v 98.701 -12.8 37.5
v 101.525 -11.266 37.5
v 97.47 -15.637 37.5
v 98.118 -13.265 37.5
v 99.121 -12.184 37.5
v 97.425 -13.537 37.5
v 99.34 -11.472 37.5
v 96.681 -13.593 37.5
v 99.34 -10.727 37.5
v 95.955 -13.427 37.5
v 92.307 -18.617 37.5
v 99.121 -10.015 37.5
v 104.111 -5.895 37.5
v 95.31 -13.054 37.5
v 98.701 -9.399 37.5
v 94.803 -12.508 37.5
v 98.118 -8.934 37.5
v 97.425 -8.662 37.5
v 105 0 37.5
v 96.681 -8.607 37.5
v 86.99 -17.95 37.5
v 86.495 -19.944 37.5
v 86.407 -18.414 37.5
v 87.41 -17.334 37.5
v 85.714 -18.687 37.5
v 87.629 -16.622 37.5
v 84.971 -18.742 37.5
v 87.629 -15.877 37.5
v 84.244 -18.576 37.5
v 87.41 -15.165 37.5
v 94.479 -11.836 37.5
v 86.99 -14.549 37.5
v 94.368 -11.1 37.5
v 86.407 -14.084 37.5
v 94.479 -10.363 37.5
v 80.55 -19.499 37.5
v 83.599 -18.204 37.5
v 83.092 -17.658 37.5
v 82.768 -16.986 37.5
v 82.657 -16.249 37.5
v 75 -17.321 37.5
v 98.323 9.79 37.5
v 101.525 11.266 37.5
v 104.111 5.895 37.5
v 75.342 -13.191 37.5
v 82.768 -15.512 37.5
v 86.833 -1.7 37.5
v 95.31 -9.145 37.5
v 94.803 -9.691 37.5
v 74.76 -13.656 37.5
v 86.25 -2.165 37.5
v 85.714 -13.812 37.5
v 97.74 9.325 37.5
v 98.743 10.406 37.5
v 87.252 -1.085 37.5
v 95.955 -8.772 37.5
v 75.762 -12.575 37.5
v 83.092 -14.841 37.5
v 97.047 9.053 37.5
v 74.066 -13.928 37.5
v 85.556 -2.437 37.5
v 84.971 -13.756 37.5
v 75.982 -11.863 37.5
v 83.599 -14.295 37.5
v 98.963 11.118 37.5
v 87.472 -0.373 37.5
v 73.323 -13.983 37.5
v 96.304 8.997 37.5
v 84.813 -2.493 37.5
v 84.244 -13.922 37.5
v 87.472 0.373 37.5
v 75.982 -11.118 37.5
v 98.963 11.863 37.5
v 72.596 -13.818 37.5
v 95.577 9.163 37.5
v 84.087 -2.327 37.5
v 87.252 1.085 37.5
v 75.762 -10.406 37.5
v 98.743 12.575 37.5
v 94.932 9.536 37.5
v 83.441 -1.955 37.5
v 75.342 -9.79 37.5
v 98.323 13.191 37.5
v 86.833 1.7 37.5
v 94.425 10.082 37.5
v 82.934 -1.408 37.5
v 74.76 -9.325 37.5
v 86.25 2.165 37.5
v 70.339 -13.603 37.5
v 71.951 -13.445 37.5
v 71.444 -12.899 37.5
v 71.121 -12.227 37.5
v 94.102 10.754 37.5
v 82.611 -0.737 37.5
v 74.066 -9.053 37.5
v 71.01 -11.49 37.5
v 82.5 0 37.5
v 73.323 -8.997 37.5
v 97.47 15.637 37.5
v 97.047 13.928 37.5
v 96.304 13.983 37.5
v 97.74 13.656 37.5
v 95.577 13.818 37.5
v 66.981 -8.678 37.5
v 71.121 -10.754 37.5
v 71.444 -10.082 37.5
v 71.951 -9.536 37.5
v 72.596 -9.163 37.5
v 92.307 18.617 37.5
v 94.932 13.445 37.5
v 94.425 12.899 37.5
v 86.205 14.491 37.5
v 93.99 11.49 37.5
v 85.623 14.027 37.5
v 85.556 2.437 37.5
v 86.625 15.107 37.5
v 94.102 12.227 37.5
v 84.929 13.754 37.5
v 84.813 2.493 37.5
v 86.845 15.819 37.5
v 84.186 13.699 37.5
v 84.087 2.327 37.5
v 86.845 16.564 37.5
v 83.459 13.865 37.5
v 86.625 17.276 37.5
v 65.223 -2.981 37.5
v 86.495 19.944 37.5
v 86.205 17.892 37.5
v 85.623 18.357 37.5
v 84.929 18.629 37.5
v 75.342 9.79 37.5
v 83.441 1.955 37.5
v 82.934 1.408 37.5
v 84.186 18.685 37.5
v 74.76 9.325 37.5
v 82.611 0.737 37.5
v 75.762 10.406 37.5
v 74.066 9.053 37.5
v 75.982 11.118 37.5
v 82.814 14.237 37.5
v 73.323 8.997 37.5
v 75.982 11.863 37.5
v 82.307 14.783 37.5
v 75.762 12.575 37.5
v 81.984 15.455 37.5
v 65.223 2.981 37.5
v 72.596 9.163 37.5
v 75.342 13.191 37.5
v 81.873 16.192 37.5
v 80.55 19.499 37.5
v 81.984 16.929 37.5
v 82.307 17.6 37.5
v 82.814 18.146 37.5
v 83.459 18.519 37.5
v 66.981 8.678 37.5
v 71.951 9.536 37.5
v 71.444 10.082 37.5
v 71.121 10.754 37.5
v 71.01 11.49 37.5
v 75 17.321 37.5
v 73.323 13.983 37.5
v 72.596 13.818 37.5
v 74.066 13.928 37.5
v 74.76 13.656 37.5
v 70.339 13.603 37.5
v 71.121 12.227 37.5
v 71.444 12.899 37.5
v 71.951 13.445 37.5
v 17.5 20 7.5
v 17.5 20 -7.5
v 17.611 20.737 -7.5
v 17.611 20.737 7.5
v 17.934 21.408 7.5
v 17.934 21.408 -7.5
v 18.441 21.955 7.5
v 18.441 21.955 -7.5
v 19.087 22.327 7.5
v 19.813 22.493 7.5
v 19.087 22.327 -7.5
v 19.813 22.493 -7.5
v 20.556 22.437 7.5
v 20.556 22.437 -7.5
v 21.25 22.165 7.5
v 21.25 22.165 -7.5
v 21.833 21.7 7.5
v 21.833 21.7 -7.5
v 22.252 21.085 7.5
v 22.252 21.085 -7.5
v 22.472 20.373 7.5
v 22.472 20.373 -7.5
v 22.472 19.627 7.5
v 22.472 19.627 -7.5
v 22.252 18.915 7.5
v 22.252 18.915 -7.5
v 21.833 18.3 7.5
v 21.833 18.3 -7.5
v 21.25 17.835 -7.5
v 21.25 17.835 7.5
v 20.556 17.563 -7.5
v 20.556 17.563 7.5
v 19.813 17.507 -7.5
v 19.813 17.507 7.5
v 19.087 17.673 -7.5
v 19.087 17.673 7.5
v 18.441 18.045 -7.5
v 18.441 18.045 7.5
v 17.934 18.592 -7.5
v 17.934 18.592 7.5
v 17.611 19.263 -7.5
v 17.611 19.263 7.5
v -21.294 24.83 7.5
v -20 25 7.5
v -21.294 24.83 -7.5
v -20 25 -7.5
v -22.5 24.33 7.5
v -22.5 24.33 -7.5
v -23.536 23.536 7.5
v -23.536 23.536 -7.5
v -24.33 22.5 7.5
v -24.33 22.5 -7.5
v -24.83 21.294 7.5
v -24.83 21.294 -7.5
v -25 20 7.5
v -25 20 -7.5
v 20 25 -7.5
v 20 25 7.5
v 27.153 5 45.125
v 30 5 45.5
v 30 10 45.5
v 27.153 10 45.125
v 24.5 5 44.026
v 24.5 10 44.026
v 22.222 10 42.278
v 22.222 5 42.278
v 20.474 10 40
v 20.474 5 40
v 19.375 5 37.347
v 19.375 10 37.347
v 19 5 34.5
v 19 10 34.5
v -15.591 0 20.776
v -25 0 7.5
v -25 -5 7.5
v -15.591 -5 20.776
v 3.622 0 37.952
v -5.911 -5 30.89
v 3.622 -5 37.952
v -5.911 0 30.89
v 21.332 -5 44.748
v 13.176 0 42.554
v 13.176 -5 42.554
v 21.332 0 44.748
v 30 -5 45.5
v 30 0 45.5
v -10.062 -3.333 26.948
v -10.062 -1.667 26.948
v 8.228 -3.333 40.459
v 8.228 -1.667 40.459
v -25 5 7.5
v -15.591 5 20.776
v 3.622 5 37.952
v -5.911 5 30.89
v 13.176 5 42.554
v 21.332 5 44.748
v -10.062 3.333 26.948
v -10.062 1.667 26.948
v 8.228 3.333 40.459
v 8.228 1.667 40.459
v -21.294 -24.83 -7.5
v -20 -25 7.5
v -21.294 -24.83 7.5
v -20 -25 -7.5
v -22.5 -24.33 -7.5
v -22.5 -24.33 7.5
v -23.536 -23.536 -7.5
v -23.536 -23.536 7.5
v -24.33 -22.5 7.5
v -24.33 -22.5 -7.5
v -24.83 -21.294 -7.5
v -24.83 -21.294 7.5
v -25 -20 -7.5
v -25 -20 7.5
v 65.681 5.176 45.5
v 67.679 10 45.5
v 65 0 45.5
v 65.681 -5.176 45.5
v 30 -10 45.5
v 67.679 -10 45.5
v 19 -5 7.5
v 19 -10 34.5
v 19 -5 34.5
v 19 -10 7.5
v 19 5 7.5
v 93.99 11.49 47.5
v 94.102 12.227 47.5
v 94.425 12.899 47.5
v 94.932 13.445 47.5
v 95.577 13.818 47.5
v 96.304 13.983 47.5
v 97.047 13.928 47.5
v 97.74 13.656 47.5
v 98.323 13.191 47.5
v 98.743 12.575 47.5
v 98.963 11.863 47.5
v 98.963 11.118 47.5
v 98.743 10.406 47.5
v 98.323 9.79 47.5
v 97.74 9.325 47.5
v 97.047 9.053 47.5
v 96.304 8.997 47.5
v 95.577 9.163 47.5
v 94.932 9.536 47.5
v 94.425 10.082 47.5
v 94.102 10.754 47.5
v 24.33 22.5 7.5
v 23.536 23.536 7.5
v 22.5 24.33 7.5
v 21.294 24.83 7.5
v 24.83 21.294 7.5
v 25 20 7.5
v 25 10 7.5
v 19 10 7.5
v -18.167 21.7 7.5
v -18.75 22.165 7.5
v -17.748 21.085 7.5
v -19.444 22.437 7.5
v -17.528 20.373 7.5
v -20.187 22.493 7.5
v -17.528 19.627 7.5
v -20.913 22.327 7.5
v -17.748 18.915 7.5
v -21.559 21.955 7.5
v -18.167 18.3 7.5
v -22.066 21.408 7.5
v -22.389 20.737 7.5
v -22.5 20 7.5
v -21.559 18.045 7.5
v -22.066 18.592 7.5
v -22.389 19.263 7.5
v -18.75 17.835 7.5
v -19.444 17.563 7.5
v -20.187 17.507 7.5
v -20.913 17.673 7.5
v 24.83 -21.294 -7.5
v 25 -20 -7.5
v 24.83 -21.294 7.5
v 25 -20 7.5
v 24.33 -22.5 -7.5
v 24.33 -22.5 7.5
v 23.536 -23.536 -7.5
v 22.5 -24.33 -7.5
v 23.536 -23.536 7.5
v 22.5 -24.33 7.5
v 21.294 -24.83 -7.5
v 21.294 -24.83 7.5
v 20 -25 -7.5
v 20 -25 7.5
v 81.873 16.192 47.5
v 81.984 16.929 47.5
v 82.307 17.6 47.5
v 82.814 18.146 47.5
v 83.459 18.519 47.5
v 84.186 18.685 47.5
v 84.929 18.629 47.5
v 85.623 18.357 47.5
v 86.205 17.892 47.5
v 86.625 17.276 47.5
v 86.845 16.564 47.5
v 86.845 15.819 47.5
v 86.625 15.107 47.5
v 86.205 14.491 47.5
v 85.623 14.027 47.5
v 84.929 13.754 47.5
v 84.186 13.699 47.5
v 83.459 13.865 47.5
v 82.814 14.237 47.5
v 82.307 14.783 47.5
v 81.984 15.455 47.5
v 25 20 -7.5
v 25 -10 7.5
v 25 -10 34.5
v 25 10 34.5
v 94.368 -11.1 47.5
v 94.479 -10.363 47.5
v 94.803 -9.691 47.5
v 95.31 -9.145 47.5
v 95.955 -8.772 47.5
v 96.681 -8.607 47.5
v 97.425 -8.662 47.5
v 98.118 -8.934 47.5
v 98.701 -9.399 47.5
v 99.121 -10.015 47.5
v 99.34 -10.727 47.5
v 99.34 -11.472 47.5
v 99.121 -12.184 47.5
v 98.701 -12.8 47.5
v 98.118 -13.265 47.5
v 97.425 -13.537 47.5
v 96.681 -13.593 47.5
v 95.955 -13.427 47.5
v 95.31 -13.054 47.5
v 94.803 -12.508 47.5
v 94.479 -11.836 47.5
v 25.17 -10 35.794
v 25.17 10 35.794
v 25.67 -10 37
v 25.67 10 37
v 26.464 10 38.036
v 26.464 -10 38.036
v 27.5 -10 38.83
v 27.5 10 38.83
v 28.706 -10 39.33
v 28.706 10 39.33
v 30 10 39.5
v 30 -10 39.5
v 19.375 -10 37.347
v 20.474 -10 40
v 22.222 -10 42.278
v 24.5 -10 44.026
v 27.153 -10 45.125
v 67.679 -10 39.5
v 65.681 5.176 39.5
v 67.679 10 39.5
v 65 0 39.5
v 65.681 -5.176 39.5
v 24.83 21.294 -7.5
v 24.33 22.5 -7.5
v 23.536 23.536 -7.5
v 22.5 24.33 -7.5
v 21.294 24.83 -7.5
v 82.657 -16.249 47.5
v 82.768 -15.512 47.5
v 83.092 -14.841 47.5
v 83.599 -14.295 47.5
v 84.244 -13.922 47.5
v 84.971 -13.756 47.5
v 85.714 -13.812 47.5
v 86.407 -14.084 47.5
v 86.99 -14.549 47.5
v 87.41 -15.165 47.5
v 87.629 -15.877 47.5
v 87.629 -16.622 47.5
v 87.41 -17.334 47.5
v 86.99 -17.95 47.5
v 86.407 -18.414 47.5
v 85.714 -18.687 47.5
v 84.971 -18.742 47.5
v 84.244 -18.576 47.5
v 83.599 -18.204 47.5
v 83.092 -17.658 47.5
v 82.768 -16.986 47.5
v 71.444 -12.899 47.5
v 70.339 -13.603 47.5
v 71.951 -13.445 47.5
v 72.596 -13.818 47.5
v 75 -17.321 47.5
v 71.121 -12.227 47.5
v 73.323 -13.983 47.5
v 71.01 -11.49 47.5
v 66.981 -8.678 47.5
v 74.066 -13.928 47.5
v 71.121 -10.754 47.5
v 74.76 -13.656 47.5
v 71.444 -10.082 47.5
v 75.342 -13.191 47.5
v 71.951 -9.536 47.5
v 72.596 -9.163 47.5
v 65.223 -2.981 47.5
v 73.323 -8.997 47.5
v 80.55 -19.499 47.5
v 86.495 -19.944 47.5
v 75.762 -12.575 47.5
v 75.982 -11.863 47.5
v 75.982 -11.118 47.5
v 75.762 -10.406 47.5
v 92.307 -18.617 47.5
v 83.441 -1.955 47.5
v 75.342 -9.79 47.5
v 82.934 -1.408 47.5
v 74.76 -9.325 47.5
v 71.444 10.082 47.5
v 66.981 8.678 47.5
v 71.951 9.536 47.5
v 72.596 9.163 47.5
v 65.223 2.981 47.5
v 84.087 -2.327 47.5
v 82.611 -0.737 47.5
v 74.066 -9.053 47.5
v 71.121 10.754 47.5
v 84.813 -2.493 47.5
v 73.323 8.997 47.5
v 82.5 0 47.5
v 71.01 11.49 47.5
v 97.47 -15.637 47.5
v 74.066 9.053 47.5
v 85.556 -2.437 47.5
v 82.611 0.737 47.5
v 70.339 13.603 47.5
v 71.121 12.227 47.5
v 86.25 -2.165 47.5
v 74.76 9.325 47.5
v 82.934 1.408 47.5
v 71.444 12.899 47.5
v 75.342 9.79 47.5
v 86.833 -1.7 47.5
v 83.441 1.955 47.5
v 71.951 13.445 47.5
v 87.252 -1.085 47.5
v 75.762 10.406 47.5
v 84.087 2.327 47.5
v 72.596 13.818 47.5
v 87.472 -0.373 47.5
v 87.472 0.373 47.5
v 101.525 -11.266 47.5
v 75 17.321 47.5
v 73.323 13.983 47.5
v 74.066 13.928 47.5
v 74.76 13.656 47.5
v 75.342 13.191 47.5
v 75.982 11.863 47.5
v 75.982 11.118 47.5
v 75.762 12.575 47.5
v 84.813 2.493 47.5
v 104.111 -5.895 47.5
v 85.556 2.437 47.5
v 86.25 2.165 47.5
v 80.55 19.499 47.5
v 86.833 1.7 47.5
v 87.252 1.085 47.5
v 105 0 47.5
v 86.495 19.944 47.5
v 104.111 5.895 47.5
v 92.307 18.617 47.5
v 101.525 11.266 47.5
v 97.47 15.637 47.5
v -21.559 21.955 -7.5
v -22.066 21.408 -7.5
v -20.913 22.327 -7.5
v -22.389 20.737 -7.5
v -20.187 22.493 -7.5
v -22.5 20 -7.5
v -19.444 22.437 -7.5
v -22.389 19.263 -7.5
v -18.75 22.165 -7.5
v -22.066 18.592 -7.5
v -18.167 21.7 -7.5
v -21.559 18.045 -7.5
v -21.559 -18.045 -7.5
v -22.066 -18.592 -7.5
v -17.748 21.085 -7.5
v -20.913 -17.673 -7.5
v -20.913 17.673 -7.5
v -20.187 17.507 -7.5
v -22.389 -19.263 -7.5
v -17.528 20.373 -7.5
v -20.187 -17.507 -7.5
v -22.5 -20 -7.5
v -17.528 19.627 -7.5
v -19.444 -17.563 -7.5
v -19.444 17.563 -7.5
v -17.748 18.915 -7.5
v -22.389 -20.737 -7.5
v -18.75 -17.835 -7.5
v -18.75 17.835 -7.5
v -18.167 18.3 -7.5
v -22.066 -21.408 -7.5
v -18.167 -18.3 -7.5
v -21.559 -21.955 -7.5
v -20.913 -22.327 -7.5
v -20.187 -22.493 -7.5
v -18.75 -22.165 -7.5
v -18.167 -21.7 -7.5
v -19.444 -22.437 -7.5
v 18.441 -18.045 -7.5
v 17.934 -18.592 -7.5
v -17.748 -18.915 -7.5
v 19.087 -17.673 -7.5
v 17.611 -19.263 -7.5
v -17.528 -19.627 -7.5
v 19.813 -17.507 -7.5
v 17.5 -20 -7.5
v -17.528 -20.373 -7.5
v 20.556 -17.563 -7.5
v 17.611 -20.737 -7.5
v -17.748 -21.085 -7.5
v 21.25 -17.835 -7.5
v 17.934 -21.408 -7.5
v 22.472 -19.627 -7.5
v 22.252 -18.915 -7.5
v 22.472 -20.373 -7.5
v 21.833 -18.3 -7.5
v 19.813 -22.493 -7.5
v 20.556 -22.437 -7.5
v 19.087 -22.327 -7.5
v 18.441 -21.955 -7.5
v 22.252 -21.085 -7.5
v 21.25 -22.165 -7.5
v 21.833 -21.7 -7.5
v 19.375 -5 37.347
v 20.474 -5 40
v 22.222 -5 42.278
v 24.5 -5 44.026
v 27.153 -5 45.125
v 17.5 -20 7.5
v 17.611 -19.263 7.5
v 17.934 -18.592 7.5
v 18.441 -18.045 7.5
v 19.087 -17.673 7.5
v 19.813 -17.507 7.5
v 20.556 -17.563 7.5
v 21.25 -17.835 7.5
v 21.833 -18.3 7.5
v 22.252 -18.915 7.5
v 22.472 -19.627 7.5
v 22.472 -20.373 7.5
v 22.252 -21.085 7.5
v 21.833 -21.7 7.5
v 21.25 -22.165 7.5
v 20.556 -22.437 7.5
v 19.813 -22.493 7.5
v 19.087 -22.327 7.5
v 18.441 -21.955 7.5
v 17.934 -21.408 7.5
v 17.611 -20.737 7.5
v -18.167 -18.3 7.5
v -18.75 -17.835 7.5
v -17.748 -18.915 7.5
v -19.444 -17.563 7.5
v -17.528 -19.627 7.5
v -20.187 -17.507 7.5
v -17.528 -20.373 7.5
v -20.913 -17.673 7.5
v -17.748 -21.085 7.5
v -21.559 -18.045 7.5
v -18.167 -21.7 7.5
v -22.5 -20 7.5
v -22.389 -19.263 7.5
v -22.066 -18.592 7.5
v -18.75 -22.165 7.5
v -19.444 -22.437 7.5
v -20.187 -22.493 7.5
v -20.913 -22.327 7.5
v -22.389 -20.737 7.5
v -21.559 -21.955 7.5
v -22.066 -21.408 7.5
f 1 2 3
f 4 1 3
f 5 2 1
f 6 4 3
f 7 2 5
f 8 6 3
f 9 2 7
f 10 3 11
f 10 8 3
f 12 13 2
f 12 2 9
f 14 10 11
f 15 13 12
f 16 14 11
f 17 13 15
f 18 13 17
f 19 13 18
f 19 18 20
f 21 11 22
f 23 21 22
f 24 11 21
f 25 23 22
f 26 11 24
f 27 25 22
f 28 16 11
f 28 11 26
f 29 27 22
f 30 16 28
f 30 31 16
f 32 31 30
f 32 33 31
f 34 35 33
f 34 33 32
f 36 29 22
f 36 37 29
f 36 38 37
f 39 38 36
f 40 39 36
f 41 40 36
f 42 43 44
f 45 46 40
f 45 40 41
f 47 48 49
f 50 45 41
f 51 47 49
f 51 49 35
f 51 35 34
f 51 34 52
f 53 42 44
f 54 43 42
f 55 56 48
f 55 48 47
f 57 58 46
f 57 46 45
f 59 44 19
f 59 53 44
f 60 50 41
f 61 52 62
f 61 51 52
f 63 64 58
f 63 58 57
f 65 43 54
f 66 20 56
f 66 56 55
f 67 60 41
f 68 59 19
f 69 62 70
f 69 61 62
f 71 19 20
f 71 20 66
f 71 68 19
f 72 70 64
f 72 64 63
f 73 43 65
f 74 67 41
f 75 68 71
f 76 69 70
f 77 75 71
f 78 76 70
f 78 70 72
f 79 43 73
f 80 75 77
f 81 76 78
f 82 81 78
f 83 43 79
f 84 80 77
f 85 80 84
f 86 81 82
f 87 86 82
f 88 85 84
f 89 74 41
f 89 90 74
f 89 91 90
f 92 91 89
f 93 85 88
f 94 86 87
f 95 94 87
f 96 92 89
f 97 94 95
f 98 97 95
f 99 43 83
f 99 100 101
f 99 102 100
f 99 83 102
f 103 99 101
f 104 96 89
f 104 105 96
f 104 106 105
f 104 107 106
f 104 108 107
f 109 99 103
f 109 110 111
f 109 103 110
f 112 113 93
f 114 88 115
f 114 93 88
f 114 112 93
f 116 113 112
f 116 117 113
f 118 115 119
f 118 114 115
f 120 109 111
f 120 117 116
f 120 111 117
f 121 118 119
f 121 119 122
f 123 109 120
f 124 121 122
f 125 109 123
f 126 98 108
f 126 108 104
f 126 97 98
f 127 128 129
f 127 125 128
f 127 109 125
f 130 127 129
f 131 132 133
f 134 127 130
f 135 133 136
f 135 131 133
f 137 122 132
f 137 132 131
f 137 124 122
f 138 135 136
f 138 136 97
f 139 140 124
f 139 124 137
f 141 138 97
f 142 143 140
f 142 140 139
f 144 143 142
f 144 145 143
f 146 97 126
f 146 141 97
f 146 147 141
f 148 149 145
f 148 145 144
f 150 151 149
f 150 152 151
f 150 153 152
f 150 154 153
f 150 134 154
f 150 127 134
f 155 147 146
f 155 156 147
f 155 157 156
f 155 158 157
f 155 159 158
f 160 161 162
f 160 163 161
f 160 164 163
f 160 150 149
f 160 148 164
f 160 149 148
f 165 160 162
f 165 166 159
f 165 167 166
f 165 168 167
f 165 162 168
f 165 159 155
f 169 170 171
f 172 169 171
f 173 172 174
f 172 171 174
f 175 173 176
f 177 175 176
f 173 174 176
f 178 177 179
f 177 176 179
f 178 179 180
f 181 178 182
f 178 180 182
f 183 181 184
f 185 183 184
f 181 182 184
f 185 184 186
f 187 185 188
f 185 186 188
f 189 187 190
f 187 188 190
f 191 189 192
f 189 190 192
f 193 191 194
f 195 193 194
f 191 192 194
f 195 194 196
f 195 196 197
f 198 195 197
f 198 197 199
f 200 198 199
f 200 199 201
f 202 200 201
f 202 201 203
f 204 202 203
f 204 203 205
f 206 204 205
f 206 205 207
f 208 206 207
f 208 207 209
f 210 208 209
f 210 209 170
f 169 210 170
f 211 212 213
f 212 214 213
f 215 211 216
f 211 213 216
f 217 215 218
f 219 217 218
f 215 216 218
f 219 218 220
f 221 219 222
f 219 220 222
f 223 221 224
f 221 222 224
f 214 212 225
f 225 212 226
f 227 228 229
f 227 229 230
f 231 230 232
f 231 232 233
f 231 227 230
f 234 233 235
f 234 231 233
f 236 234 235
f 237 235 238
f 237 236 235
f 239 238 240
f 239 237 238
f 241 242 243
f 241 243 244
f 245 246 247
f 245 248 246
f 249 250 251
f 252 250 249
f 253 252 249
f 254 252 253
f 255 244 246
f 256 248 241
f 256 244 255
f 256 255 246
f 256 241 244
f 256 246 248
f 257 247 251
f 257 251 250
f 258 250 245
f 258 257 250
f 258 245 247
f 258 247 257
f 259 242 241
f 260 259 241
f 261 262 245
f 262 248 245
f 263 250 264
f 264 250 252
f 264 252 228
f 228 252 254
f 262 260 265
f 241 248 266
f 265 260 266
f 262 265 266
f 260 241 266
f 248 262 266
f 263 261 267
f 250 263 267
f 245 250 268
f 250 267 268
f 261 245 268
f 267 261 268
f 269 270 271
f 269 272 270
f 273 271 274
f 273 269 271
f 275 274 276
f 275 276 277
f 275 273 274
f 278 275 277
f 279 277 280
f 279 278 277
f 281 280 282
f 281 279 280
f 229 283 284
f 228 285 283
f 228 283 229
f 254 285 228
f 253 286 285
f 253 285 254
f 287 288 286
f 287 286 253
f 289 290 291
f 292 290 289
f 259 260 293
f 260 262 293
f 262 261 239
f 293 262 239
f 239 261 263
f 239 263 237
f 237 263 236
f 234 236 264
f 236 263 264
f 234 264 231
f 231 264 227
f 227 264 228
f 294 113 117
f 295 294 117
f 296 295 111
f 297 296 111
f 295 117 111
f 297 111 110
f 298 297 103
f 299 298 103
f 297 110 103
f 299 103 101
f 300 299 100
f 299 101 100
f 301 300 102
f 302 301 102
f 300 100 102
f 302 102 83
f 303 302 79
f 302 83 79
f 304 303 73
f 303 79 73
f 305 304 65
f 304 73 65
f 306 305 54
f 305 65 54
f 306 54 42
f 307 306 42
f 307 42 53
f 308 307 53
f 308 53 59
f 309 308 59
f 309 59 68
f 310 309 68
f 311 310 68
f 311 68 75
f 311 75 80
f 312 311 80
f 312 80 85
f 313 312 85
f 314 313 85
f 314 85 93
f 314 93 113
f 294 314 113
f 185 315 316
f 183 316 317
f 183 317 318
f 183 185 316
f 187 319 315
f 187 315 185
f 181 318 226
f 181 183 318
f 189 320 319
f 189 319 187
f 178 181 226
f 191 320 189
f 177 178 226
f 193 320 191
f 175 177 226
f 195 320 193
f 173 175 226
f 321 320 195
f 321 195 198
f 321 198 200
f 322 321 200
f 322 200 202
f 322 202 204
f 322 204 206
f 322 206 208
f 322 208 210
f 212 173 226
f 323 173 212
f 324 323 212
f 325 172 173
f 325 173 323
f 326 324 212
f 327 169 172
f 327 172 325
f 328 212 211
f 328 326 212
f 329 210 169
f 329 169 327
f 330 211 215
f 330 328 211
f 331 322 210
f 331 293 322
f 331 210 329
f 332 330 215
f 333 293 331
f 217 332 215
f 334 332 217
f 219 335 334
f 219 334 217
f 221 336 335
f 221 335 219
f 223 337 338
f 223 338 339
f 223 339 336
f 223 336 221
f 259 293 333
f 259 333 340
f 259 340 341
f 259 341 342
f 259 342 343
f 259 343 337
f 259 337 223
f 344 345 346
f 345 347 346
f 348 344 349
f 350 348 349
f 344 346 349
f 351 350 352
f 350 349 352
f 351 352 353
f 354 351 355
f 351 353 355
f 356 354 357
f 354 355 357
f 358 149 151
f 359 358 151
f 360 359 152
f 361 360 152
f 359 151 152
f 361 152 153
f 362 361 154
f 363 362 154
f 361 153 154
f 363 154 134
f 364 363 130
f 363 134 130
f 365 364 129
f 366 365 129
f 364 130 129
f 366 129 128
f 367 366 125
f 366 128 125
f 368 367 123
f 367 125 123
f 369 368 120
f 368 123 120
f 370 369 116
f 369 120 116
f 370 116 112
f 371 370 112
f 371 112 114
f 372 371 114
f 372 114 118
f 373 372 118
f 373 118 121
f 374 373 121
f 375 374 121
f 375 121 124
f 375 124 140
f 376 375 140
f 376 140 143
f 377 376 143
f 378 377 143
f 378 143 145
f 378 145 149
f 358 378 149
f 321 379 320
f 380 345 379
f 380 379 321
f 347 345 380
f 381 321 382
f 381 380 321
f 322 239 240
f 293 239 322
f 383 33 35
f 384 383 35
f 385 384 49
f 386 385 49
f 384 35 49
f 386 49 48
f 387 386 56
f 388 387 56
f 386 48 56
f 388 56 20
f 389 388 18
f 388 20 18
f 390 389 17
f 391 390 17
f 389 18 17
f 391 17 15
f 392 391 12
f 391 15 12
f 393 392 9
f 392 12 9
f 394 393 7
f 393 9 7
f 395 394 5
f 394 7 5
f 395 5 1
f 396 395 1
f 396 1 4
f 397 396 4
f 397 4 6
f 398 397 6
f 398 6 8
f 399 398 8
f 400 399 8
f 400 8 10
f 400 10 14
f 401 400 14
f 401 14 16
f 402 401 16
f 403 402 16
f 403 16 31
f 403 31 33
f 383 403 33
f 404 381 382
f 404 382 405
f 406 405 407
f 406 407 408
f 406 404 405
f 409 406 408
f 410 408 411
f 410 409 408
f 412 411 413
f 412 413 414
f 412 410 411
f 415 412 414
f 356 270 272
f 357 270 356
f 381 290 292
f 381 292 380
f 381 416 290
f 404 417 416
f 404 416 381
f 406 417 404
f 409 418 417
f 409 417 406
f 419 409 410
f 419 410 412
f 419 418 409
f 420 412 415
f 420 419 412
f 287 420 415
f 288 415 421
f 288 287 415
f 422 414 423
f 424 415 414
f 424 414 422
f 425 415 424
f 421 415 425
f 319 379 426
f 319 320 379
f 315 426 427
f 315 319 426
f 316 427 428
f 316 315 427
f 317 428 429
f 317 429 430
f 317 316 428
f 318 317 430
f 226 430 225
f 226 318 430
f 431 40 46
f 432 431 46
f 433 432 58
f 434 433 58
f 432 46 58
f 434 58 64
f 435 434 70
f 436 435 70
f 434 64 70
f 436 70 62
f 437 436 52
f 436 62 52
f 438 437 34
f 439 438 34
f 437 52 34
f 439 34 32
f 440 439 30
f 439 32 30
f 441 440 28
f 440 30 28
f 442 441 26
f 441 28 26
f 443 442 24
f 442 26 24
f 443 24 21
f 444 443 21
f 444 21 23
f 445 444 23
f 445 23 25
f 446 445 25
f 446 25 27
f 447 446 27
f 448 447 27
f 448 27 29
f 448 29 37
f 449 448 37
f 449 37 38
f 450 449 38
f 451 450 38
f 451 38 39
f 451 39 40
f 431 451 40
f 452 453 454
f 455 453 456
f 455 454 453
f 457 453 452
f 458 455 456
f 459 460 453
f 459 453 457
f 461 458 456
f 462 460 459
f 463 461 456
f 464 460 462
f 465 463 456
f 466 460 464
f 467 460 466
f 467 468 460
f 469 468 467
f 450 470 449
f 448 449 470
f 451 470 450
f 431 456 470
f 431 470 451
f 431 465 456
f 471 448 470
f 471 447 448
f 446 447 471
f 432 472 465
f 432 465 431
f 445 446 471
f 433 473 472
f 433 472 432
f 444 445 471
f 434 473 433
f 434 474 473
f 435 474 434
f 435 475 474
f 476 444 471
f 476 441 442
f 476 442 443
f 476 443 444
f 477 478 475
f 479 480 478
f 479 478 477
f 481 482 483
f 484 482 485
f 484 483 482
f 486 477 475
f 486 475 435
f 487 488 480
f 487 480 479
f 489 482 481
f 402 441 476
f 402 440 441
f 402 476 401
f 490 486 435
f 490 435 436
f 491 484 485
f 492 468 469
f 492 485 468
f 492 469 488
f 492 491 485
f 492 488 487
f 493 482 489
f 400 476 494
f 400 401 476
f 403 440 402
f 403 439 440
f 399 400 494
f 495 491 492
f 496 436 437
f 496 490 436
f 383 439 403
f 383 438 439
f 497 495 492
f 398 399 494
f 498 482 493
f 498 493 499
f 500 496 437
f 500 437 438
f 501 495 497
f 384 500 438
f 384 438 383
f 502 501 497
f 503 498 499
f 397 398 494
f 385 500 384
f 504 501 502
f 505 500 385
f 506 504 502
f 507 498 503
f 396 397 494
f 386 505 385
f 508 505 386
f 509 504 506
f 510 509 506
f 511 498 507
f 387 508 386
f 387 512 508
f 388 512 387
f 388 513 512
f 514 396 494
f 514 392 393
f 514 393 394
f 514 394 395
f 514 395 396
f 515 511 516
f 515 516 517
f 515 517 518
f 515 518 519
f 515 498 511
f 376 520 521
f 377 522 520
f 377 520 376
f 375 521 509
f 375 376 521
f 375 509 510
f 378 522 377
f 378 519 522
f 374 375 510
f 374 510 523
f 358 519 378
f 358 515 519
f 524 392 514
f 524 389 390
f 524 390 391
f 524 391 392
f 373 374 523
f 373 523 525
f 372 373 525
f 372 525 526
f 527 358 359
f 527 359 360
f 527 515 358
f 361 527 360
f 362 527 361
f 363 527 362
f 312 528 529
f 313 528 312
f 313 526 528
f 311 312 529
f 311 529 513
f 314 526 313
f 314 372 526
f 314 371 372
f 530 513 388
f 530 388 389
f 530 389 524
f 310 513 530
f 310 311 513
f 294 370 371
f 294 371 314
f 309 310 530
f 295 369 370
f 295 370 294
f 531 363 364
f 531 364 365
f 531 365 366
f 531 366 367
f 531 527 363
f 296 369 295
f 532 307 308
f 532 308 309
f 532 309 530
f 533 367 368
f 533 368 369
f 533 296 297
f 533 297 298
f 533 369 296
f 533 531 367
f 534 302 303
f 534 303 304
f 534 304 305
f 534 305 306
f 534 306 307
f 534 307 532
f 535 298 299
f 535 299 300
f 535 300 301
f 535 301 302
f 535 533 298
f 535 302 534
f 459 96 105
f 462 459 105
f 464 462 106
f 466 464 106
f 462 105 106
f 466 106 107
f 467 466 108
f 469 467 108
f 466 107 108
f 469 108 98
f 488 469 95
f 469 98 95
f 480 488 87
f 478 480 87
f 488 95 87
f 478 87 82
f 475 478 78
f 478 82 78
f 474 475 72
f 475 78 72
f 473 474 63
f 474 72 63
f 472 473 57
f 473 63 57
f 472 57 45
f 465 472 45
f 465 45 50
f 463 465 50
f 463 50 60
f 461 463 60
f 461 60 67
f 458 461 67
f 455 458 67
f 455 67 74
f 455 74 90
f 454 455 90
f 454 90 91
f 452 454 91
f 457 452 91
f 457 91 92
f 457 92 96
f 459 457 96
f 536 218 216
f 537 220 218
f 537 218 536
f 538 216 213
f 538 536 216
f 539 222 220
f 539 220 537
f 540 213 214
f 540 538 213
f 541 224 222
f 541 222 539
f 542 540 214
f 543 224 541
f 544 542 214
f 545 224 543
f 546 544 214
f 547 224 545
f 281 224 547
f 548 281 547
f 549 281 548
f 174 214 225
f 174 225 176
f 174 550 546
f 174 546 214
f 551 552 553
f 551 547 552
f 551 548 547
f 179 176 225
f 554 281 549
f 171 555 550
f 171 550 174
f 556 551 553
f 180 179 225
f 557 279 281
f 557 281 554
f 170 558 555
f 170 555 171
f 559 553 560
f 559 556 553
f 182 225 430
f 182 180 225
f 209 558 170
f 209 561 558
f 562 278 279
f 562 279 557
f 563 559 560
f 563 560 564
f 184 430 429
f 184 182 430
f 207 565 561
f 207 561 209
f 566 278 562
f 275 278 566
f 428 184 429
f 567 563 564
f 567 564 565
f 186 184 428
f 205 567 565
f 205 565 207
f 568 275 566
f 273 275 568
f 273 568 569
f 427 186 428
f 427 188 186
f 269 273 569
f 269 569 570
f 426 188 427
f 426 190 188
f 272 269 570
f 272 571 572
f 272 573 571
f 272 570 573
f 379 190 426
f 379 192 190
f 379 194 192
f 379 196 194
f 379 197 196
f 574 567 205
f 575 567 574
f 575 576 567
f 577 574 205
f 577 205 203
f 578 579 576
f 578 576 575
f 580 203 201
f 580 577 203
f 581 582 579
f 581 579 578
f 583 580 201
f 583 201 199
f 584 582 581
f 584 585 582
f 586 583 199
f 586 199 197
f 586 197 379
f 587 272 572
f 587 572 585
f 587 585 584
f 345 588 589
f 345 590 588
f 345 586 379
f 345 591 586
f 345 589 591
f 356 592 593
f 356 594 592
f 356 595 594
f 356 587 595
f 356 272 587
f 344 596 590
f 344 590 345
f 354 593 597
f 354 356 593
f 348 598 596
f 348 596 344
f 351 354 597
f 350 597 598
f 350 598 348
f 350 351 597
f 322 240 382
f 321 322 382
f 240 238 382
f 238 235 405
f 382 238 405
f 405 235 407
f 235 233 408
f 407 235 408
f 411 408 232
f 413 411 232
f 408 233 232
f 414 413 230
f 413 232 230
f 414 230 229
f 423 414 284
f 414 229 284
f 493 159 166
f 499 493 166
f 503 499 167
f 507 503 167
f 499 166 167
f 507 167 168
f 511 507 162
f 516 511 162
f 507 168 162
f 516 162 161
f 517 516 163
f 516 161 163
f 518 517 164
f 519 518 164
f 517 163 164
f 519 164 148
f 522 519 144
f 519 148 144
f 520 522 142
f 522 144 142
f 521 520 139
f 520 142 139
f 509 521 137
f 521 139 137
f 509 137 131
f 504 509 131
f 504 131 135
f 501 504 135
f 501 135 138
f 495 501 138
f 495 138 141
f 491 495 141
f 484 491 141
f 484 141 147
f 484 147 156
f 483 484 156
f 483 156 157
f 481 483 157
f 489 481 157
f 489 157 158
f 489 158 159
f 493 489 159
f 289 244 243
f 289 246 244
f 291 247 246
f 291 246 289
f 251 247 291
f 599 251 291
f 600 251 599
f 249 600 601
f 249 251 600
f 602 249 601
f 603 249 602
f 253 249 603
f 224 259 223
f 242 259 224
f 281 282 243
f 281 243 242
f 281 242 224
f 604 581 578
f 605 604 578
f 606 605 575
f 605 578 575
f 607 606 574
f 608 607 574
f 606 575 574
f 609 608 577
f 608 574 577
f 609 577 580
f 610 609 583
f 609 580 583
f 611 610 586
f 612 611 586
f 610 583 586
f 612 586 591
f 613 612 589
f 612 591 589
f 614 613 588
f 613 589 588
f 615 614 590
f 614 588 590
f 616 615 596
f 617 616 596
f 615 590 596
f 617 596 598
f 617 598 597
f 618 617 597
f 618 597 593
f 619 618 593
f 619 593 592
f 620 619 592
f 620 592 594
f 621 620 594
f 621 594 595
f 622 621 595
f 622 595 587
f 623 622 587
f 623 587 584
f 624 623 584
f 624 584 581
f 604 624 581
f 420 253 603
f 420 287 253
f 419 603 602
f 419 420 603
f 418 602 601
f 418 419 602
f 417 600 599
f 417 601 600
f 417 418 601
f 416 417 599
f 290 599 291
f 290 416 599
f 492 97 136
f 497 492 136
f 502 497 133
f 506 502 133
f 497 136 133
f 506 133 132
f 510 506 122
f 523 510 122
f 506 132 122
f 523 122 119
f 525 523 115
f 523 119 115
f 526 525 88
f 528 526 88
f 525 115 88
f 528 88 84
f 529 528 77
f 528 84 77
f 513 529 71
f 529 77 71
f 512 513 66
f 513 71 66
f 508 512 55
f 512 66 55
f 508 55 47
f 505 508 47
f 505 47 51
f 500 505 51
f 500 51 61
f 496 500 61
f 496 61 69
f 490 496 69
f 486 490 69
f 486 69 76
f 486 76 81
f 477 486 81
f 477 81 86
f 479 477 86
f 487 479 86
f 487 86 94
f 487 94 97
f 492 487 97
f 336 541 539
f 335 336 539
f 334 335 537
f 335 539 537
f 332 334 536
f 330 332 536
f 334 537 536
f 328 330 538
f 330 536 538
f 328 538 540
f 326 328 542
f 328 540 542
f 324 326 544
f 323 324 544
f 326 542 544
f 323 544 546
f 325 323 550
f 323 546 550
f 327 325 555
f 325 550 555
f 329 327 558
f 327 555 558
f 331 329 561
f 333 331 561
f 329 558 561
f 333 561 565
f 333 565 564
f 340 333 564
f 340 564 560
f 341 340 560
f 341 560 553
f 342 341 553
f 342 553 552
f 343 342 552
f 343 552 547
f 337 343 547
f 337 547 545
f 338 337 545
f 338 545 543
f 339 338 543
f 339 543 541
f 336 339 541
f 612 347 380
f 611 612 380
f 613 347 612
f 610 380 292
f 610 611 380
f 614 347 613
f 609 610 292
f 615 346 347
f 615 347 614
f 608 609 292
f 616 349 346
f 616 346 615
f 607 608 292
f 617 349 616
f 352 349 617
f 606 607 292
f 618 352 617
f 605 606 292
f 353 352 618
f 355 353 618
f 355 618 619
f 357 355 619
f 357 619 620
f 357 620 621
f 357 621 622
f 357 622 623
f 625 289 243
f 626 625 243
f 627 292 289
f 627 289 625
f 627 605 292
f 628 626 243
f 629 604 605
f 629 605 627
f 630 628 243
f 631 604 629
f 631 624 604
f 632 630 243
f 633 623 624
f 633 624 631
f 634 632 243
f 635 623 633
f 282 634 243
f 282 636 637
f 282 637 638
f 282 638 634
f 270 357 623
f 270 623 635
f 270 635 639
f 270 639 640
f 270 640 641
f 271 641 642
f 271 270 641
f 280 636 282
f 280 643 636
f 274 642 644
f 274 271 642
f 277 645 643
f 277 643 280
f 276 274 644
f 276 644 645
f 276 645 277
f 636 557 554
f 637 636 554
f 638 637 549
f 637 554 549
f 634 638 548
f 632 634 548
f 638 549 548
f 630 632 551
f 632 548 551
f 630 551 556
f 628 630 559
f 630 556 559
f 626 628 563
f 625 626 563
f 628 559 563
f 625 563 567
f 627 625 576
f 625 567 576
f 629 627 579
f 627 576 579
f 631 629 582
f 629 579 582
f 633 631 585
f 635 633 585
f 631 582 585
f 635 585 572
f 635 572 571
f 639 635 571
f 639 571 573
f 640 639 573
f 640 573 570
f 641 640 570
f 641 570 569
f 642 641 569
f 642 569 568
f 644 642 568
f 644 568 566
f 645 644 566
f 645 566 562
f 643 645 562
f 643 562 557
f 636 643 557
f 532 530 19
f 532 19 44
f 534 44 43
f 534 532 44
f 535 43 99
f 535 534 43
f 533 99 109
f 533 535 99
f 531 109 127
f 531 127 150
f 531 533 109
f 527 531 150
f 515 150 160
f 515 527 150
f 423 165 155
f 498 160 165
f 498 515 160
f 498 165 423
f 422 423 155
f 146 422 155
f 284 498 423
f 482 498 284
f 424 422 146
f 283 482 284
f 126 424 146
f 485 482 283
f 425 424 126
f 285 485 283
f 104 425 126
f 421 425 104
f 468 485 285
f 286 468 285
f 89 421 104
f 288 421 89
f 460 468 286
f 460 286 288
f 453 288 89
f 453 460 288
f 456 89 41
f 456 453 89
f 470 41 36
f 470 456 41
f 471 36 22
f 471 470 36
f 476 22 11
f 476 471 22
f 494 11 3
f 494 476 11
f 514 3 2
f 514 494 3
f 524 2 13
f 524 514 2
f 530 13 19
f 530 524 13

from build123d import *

# Parameters (mm, degrees)
F1_DEPTH = 25
F2_DEPTH = 5
F0_W     = 20
F0_H     = 6
F3_DEPTH = 10
F5_R     = 5
F7_D     = 5
F9_D     = 5


with BuildPart() as f1:
    # F0 (on Front) → F1 (new body, symmetric)
    with BuildSketch(Plane.XZ):
        Polygon((25, -7.5), (25, 7.5), (19, 7.5), (-25, 7.5), (-25, -7.5), align=None)
    extrude(amount=F1_DEPTH, both=True)

    # F0 (on Front) → F2 (join, symmetric)
    with BuildSketch(Plane.XZ):
        with BuildLine():
            Line((-25, 7.5), (19, 7.5))
            Line((19, 7.5), (19, 34.5))
            ThreePointArc((19, 34.5), (22.2218254069, 42.2781745931), (30, 45.5))
            add(Edge.make_bspline(
                [(-25, 7.5), (-11.6937831044, 29.0705016255), (6.4437664114, 45.5402298272), (30, 45.5)],
                knots=[0, 0, 0, 0, 66.8505796534, 66.8505796534, 66.8505796534, 66.8505796534], degree=3))
        make_face()
    extrude(amount=F2_DEPTH, both=True)

    # F0 (on Front) → F3 (join, symmetric)
    with BuildSketch(Plane.XZ):
        with BuildLine():
            Line((19, 7.5), (25, 7.5))
            Line((25, 7.5), (25, 34.5))
            ThreePointArc((25, 34.5), (26.4644660941, 38.0355339059), (30, 39.5))
            Line((30, 39.5), (65, 39.5))
            Line((65, 39.5), (65, 45.5))
            Line((65, 45.5), (30, 45.5))
            ThreePointArc((30, 45.5), (22.2218254069, 42.2781745931), (19, 34.5))
            Line((19, 34.5), (19, 7.5))
        make_face()
        with Locations((75, 42.5)):
            Rectangle(F0_W, F0_H)
    extrude(amount=F3_DEPTH, both=True)

    # F0 (on Front) → F4 (revolve)
    with BuildSketch(Plane.XZ):
        Polygon((85, 45.5), (85, 39.5), (85, 37.5), (105, 37.5), (105, 47.5), (85, 47.5), align=None)
    revolve(axis=Axis((85, 0, 42.5), (0, 0, 1)))

    # F5
    f5_edges = [f1.edges().sort_by_distance(p)[0] for p in [
        (25, 25, 0),
        (-25, 25, 0),
        (25, -25, 0),
        (-25, -25, 0),
    ]]
    fillet(f5_edges, radius=F5_R)

    # F7 (through all)
    with Locations(Plane.XY.offset(7.5)):
        with Locations((20, 20), (-20, 20), (20, -20), (-20, -20)):
            Hole(F7_D / 2)

    # F9 (through all)
    with Locations(Plane.XY.offset(47.5)):
        with Locations((85, 0), (73.5095148057, 11.4904851943), (96.4904851943, 11.4904851943), (73.5095148057, -11.4904851943), (96.8682619299, -11.0995354601), (85.1573778884, -16.249237896), (84.3727141619, 16.1917116493)):
            Hole(F9_D / 2)


solid = f1.part
